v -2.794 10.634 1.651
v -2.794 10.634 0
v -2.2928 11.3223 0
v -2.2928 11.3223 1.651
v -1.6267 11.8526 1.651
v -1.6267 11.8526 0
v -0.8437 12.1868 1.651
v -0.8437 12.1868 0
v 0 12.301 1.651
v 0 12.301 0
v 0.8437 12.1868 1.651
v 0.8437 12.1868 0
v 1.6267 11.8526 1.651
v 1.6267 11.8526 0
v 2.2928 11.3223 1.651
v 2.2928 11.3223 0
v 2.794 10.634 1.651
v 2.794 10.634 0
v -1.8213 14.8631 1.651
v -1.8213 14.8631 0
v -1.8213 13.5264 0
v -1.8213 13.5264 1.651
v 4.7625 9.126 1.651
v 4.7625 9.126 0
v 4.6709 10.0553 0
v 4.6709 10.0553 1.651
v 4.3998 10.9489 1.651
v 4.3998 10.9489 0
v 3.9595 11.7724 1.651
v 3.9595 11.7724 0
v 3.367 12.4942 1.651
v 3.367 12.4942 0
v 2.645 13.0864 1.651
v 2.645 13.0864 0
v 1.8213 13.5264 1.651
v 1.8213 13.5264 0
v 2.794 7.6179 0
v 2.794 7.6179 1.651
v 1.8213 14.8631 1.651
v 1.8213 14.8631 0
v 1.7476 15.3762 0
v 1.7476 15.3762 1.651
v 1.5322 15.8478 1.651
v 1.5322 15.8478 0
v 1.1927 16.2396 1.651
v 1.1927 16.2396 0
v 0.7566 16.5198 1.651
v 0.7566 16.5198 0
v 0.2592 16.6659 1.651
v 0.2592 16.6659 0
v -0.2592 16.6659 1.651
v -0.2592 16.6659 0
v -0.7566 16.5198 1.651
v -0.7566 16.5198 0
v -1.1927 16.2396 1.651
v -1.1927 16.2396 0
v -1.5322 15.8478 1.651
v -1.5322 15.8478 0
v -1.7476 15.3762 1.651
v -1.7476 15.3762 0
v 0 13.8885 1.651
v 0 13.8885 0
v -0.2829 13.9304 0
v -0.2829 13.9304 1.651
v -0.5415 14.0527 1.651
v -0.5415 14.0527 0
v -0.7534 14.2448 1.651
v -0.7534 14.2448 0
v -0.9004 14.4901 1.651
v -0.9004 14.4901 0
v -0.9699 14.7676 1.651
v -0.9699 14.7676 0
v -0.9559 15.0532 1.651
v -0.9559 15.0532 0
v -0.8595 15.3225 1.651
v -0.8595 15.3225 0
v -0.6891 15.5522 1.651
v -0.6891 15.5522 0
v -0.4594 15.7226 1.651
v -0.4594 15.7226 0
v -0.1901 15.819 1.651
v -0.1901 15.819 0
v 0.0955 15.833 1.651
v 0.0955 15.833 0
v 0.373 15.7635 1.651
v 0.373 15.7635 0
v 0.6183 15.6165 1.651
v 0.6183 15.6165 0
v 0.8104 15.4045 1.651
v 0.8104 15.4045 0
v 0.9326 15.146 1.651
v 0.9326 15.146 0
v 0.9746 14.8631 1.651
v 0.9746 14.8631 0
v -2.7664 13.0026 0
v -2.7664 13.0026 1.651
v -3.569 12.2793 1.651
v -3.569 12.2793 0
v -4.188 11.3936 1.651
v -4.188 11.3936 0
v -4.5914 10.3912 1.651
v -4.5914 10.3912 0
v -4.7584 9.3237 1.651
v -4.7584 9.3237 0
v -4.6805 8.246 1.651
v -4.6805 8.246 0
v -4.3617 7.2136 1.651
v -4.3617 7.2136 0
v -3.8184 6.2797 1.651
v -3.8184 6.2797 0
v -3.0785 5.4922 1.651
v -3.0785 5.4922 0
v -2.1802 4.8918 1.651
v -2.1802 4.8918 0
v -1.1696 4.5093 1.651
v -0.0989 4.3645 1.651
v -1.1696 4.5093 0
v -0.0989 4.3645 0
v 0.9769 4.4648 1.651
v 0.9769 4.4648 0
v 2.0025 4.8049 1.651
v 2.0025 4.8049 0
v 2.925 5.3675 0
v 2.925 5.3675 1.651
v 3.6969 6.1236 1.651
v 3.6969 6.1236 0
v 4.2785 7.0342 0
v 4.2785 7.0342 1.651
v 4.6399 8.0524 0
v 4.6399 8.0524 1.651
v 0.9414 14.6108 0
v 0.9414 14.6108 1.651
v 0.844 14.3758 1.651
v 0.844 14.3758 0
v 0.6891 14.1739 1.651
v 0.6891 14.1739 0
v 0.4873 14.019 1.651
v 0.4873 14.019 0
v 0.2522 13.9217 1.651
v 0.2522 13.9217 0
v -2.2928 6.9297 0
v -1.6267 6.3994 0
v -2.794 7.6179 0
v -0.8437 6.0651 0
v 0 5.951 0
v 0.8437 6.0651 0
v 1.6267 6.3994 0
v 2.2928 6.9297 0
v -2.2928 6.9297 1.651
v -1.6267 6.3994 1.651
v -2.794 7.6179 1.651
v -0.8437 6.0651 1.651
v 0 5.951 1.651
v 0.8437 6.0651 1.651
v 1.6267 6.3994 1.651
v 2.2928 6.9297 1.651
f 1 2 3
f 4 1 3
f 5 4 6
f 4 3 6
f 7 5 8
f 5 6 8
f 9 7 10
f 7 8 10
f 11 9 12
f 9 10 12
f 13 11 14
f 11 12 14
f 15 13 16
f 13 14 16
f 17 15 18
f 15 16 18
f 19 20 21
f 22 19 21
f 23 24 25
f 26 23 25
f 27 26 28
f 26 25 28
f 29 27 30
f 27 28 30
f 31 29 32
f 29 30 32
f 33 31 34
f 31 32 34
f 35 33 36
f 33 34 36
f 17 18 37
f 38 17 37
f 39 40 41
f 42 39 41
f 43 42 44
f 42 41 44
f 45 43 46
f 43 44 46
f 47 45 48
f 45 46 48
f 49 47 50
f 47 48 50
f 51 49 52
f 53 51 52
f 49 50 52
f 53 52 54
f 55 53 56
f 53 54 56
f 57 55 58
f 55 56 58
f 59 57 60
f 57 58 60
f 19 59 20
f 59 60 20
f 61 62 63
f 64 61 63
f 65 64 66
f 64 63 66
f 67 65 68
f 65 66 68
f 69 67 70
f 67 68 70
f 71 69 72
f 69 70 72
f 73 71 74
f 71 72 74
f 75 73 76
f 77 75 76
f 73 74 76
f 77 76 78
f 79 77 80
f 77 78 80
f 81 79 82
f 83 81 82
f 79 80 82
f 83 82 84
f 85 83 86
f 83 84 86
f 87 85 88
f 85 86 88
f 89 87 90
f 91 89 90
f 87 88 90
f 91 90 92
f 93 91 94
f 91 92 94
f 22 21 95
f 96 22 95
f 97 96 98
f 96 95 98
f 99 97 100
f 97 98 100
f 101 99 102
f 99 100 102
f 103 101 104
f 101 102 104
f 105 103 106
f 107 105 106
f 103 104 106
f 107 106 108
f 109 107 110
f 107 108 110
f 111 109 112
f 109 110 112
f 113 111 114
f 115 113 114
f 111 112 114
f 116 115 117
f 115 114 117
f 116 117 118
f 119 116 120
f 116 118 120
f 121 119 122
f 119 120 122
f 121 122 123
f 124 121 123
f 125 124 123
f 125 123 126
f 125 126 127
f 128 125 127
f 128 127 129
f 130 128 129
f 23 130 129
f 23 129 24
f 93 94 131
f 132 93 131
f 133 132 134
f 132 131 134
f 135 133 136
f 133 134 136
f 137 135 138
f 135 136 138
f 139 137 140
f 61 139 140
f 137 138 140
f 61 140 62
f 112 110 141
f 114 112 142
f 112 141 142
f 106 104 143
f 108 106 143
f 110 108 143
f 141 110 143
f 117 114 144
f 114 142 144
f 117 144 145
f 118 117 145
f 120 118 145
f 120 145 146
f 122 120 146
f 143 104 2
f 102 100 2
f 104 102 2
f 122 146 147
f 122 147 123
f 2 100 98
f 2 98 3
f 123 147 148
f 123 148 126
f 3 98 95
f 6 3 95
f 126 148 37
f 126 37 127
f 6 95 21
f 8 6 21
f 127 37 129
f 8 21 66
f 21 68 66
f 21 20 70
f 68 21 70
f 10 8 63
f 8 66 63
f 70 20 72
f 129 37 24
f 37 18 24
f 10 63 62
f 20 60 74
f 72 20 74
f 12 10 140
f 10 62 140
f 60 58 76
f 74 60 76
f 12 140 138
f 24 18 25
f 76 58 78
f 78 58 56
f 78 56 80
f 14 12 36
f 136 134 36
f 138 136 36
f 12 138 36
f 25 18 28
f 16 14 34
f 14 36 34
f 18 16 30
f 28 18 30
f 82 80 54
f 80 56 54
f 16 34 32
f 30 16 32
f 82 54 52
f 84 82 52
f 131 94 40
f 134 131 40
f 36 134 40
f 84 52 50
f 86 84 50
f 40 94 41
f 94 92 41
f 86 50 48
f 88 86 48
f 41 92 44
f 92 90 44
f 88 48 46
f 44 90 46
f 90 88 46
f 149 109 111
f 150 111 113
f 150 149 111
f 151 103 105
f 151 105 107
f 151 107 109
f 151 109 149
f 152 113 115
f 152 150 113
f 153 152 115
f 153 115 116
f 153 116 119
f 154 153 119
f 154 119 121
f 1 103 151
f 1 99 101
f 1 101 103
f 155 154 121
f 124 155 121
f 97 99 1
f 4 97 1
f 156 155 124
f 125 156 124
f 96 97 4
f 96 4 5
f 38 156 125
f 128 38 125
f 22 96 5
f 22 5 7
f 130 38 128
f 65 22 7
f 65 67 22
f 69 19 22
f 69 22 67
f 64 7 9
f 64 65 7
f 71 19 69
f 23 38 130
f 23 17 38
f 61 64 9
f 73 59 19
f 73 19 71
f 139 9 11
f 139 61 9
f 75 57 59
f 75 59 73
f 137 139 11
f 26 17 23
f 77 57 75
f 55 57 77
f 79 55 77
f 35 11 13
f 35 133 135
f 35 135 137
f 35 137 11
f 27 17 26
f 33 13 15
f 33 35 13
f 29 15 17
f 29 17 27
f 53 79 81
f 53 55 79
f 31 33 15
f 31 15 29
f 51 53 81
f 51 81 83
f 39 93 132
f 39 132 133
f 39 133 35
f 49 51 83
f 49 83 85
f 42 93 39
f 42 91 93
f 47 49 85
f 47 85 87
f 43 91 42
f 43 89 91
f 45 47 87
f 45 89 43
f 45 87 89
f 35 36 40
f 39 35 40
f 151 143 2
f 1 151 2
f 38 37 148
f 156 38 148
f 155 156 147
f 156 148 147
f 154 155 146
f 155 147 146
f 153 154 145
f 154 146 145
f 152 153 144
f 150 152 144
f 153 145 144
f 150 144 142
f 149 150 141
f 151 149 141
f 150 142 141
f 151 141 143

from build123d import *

# Parameters (mm, degrees)
F1_DEPTH = 1.651


with BuildPart() as f1:
    # F0 (on Top) → F1 (new body)
    with BuildSketch(Plane.XY):
        with BuildLine():
            ThreePointArc((1.8213407221, 13.5264450688), (0.9284865025, 13.7970918303), (2e-09, 13.8884764319))
            ThreePointArc((2e-09, 13.8884764319), (-0.9284865005, 13.7970918307), (-1.8213407221, 13.5264450688))
            ThreePointArc((-1.8213407221, 13.5264450688), (-2.6464382726, 5.1664599565), (4.7625, 9.1259764319))
            ThreePointArc((4.7625, 9.1259764319), (3.9595164755, 11.7724147045), (1.8213407221, 13.5264450688))
        make_face()
        with BuildLine():
            ThreePointArc((-2.794, 10.634017877), (0, 12.3009764319), (2.794, 10.634017877))
            Line((2.794, 10.634017877), (2.794, 7.6179349869))
            ThreePointArc((2.794, 7.6179349869), (0, 5.9509764319), (-2.794, 7.6179349869))
            Line((-2.794, 7.6179349869), (-2.794, 10.634017877))
        make_face(mode=Mode.SUBTRACT)
        with BuildLine():
            ThreePointArc((-1.8213407221, 13.5264450688), (-0.9284865005, 13.7970918307), (2e-09, 13.8884764319))
            ThreePointArc((2e-09, 13.8884764319), (0.9284865025, 13.7970918303), (1.8213407221, 13.5264450688))
            Line((1.8213407221, 13.5264450688), (1.8213407221, 14.8630785568))
            ThreePointArc((1.8213407221, 14.8630785568), (0, 16.6844192788), (-1.8213407221, 14.8630785568))
            Line((-1.8213407221, 14.8630785568), (-1.8213407221, 13.5264450688))
        make_face()
        with BuildLine():
            ThreePointArc((2e-09, 13.8884764319), (-0.6891477722, 15.5522263275), (0.9746021248, 14.8630785568))
            ThreePointArc((0.9746021248, 14.8630785568), (0.6891477722, 14.173930786), (2e-09, 13.8884764319))
        make_face(mode=Mode.SUBTRACT)
    extrude(amount=F1_DEPTH)


solid = f1.part
